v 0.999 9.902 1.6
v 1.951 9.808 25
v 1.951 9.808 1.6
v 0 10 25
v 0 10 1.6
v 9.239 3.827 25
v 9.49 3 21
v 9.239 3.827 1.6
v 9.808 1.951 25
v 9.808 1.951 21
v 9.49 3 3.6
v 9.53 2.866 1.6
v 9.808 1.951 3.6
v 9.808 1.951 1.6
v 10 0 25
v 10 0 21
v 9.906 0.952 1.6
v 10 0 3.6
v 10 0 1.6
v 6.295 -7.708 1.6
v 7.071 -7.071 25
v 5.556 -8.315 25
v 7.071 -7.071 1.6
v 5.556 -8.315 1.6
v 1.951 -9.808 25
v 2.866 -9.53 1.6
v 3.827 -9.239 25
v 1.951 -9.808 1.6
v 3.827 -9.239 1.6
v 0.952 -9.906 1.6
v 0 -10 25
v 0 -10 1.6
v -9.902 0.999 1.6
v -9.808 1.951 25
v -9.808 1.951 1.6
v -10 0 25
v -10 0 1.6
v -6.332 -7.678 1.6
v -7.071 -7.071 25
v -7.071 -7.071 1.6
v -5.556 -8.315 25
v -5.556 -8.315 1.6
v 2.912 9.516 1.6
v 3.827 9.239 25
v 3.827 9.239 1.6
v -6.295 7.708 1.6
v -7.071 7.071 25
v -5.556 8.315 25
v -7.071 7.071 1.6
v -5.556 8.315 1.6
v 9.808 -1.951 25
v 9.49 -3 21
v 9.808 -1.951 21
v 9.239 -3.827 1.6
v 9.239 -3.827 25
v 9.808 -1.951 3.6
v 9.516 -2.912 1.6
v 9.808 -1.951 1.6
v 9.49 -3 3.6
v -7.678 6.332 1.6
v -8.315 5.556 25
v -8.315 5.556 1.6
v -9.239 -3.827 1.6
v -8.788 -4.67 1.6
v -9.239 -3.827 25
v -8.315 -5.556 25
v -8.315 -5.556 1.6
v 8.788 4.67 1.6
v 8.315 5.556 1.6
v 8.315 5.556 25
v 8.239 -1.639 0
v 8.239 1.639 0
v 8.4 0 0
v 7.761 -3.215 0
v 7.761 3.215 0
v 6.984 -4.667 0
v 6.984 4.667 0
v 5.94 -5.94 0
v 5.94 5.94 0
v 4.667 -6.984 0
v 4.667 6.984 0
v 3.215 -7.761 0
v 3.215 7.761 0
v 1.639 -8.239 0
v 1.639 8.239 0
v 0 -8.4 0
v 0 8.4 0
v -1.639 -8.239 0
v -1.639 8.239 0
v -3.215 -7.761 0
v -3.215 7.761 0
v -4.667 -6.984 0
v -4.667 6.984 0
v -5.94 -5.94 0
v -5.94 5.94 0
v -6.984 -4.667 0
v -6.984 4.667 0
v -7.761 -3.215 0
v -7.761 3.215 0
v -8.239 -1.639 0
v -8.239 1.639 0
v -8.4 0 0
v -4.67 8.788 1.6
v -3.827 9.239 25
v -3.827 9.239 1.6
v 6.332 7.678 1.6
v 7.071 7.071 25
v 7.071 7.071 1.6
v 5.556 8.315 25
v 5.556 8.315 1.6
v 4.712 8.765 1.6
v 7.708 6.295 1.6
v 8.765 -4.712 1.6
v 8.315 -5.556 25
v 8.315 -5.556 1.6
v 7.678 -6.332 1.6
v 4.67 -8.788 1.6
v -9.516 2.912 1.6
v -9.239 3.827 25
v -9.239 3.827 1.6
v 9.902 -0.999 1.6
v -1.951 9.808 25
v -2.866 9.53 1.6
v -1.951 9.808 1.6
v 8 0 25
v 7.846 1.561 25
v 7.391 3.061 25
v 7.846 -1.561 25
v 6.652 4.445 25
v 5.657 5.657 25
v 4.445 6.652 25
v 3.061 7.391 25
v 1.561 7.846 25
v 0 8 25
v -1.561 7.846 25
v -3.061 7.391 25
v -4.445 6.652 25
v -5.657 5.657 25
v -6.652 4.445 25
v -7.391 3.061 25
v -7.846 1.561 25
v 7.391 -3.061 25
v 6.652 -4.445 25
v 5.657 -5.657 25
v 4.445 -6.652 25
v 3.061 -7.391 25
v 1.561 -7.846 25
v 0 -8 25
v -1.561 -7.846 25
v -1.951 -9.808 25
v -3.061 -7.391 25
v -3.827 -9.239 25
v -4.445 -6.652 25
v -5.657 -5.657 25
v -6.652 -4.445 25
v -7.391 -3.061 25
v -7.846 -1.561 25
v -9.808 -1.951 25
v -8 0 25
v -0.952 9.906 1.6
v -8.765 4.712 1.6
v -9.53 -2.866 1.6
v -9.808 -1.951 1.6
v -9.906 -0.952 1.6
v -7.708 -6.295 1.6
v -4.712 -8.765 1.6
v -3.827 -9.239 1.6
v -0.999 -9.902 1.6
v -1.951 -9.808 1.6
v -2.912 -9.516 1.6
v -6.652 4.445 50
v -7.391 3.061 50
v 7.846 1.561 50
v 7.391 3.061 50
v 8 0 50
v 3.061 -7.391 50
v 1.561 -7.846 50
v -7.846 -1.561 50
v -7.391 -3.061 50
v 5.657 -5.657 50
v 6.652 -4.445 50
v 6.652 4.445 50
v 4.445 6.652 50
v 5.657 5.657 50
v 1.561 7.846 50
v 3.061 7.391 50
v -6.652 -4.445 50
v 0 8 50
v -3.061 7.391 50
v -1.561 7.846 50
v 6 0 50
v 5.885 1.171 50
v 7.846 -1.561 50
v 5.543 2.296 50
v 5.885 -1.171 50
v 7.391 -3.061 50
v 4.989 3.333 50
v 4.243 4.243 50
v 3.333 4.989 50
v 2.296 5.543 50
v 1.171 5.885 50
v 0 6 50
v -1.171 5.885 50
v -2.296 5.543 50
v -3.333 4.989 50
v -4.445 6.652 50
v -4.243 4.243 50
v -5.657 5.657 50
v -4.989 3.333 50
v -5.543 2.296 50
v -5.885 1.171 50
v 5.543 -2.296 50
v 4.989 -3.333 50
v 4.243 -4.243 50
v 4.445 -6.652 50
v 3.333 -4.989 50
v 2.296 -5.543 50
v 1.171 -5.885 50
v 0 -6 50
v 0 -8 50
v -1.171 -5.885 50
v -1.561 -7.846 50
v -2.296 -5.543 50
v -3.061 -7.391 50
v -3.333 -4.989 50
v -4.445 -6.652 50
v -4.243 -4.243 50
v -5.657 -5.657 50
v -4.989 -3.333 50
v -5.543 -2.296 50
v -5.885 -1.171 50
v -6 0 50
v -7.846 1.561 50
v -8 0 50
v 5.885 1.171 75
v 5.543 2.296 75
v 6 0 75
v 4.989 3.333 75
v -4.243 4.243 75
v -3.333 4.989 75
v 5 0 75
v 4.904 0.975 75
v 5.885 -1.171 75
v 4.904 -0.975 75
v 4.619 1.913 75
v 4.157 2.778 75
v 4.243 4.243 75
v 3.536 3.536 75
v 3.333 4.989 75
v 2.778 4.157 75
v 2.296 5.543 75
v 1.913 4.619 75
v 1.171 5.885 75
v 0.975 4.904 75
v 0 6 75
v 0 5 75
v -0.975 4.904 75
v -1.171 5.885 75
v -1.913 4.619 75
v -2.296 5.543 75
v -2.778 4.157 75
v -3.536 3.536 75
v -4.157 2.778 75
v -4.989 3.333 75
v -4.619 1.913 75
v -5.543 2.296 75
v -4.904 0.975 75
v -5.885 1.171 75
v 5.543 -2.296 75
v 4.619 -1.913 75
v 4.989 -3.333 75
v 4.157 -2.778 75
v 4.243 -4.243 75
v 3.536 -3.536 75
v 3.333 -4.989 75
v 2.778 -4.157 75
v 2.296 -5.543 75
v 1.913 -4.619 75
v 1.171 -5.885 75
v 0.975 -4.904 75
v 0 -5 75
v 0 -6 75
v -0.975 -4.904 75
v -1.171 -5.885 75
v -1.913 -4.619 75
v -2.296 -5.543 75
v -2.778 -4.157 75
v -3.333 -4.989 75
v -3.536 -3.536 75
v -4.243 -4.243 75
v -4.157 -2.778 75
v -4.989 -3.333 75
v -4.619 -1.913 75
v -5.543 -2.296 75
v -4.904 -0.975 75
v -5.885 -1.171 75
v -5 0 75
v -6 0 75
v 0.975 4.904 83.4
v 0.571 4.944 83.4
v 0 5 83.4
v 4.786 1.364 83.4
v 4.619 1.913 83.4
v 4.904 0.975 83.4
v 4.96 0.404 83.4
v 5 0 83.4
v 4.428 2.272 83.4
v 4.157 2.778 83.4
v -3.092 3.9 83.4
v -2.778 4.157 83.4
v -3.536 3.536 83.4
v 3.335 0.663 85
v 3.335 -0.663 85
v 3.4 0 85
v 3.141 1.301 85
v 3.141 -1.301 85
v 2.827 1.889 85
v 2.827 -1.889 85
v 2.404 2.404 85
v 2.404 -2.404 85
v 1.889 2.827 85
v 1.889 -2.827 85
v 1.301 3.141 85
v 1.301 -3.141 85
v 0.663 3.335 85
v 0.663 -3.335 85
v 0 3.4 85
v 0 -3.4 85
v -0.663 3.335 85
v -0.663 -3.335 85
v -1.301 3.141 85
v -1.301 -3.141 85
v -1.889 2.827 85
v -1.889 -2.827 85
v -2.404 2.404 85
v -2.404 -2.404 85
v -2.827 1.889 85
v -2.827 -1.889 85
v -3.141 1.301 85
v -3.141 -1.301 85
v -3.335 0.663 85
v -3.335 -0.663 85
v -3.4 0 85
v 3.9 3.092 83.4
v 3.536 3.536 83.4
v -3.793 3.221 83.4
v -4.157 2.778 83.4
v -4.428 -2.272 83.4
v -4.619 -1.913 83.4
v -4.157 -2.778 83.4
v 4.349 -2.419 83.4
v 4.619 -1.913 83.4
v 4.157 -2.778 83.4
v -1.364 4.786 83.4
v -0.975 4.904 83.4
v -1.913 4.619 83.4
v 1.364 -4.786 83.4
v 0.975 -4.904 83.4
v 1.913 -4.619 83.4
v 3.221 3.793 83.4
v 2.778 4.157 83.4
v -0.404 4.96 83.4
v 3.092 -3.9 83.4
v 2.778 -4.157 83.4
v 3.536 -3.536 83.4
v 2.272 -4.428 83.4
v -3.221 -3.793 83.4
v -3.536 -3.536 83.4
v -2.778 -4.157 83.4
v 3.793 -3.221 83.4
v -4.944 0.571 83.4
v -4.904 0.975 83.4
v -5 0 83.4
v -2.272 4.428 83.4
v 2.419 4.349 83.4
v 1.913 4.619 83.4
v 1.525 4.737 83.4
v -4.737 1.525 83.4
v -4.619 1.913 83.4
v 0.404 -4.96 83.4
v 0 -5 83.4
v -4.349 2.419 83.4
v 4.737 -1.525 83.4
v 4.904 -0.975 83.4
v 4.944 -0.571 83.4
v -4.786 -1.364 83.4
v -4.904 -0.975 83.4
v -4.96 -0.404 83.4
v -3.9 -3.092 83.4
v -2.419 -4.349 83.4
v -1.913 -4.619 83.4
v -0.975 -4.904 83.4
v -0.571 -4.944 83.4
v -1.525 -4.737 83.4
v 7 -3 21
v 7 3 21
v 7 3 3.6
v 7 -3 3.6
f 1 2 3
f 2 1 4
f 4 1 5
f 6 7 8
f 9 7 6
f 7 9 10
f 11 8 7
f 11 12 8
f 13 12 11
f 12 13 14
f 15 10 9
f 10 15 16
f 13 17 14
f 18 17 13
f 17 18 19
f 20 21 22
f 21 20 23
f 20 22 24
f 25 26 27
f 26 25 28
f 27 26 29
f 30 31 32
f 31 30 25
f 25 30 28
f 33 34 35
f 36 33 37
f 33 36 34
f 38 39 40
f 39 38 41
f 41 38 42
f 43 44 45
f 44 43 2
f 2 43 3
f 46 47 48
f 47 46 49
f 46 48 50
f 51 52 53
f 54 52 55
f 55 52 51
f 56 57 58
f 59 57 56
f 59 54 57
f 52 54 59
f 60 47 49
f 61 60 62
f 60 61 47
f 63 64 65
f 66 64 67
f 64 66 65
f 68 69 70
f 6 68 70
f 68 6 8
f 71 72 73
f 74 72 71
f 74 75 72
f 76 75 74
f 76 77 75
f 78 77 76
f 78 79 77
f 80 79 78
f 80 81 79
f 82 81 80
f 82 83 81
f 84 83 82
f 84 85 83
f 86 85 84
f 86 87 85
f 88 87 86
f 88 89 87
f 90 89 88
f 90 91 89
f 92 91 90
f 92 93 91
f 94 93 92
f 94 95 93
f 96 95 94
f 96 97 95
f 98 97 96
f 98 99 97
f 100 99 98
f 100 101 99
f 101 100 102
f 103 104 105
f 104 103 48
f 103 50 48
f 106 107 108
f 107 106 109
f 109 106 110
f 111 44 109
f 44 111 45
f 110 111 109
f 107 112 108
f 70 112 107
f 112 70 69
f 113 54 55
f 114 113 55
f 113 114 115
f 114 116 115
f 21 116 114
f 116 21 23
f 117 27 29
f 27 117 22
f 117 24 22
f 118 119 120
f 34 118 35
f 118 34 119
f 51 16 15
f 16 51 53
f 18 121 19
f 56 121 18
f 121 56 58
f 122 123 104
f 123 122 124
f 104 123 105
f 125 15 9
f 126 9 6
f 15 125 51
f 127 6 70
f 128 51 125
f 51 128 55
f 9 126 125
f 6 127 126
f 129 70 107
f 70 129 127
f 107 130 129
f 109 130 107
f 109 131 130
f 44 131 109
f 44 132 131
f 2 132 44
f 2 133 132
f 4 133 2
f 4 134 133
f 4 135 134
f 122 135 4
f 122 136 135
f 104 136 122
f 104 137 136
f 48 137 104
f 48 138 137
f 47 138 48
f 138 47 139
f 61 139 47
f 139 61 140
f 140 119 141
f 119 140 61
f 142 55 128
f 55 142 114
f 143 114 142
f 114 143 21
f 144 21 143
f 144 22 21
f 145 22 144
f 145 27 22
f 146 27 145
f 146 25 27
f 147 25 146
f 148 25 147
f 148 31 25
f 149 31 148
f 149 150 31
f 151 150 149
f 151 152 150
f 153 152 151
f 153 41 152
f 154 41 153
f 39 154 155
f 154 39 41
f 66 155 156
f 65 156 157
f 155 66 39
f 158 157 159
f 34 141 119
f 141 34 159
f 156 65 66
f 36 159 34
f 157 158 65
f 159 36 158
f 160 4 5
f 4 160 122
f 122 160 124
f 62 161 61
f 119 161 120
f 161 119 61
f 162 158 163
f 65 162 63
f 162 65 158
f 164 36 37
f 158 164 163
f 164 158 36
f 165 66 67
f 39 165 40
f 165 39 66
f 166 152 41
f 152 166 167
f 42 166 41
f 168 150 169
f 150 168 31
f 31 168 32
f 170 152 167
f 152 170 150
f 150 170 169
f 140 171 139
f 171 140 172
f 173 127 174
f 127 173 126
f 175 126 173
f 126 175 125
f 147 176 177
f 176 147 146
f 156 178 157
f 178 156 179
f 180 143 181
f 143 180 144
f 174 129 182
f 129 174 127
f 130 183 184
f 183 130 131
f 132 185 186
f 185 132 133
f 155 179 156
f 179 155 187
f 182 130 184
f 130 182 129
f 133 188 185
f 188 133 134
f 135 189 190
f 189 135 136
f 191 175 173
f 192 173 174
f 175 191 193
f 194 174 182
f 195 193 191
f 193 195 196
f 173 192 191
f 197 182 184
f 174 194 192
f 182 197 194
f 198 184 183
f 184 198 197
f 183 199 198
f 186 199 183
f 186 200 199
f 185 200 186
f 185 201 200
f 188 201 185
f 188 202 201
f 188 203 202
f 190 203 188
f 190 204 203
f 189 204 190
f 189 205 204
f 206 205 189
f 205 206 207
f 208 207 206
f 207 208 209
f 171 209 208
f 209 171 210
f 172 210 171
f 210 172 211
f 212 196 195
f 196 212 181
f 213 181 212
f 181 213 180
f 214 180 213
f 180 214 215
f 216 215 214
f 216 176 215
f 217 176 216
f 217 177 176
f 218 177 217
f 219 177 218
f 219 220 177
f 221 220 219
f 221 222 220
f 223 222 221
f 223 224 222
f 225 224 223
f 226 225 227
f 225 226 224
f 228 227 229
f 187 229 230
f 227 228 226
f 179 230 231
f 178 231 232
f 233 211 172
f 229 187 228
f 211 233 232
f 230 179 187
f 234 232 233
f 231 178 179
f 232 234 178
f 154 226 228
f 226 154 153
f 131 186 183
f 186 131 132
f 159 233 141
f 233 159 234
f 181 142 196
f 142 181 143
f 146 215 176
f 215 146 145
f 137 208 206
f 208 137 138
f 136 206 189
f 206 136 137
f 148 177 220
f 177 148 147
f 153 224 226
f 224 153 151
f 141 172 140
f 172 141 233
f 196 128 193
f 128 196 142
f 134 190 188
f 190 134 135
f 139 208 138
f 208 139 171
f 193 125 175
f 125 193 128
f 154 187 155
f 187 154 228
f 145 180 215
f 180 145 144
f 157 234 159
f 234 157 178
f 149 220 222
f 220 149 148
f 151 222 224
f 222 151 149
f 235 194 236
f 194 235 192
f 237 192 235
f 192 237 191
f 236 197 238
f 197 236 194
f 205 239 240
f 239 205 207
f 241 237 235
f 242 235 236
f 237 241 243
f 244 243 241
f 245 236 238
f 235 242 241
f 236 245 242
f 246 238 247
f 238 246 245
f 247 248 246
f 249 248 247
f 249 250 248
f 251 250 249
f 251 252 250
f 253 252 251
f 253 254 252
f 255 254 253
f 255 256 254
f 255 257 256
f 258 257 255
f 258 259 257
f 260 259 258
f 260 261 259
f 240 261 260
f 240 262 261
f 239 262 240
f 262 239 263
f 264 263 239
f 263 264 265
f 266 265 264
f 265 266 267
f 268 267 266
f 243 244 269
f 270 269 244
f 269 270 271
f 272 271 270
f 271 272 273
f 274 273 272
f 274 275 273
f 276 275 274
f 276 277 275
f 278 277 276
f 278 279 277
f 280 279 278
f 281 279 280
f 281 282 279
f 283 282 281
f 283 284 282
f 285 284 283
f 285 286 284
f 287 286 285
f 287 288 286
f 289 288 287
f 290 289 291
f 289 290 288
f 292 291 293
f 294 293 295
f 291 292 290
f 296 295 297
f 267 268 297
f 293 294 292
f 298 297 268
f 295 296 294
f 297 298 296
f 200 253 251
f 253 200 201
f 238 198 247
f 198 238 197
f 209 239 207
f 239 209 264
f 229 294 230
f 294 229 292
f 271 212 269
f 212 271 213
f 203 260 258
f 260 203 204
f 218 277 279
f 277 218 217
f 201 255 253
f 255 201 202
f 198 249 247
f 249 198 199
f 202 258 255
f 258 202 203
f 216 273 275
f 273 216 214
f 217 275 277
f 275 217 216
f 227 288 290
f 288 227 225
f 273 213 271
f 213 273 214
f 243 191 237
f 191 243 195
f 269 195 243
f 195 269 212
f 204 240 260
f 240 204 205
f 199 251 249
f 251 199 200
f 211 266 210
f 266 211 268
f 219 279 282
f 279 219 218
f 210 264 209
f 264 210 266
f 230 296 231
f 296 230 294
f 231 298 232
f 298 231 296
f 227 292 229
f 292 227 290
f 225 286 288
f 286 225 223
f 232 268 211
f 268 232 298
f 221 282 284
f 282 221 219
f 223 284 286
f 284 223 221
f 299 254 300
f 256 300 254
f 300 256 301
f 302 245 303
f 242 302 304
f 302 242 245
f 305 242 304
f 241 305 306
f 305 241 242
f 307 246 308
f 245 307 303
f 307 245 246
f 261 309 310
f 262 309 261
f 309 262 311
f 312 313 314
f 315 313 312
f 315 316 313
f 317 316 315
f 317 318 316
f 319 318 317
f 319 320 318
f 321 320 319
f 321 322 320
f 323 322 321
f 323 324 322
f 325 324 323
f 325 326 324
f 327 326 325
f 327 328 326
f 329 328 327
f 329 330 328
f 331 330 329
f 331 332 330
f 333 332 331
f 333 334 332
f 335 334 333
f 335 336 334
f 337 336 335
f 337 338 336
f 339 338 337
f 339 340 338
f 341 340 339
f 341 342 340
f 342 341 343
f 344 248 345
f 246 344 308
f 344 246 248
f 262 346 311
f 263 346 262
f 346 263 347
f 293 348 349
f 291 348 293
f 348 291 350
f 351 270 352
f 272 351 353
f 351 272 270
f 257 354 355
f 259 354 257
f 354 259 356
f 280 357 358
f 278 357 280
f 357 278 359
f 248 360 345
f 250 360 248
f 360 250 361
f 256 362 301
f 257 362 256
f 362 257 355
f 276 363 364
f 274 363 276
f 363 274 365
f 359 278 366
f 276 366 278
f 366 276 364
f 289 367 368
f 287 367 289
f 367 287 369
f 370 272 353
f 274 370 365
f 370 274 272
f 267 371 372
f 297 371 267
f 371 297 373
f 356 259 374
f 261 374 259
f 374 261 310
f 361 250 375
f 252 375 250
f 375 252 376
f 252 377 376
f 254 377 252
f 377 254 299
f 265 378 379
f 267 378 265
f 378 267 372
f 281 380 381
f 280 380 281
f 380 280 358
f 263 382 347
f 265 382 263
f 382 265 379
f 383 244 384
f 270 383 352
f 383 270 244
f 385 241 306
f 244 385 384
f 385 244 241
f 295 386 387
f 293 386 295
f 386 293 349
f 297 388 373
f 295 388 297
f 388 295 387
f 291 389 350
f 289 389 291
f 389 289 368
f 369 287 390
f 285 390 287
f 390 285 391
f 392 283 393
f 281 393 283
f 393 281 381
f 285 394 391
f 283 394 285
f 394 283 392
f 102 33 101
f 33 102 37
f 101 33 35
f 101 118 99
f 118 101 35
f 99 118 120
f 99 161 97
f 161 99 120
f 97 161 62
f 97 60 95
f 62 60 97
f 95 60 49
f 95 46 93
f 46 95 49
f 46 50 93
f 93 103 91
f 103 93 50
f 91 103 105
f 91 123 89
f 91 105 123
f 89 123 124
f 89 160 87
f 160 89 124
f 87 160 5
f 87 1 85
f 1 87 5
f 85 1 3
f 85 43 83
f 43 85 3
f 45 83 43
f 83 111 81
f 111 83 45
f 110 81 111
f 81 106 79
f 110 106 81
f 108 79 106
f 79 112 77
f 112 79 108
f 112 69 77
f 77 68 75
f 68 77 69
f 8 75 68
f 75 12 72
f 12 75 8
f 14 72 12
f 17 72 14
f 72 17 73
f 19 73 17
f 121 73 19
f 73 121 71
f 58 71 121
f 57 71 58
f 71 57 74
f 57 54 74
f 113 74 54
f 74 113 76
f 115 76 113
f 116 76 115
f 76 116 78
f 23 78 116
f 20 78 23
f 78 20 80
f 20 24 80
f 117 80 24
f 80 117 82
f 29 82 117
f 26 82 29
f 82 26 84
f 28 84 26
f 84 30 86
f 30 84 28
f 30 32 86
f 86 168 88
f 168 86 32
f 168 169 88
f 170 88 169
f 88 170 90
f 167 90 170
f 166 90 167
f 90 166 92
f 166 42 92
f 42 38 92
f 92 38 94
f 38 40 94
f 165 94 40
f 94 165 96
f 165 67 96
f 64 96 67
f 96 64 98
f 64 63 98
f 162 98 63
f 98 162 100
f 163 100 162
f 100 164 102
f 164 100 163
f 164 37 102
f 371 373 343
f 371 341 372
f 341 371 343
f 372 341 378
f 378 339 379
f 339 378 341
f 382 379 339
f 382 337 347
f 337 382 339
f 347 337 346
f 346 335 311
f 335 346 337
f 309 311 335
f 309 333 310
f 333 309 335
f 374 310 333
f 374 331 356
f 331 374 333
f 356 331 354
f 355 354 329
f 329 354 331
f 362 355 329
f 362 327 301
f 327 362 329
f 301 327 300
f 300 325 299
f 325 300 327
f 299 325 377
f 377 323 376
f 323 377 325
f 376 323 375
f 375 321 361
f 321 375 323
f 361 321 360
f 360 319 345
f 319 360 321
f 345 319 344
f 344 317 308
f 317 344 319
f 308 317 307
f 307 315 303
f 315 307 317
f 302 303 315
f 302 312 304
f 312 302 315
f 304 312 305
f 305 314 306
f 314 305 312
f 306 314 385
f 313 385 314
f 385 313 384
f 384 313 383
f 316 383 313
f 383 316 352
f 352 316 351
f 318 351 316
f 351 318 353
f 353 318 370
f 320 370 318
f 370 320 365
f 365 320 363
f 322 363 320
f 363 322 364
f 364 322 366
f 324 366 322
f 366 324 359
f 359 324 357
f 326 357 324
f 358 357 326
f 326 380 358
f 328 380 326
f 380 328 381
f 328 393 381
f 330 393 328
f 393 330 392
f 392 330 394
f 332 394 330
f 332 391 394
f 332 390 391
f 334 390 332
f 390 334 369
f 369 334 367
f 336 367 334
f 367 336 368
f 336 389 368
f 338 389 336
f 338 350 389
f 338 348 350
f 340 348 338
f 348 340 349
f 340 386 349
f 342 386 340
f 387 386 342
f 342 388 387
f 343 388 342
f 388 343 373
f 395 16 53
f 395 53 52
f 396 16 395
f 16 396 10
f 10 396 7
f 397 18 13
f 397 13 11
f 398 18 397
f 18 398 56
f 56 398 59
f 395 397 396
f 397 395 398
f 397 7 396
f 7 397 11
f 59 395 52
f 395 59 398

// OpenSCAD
$fn = 32;

// ----------------------------------------------------------------------
// Stepped shaft: diameters 20, 16, 12, 10 mm, 85 mm long
// ----------------------------------------------------------------------

// --- parameters (mm) ---
d1 = 20;                  // step 1 diameter
len1 = 25;                // step 1 length
d2 = 16;                  // step 2 diameter
len2 = 25;                // step 2 length
d3 = 12;                  // step 3 diameter
len3 = 25;                // step 3 length
d4 = 10;                  // step 4 diameter
len4 = 10;                // step 4 length
total = 85;               // overall length
chamfer = 1.6;            // end chamfer
key_w = 6;                // keyway width
key_d = 3;                // keyway depth
key_len = 17.4;           // keyway length
key_z = 3.6;              // keyway start along the shaft

difference() {
  /* turned body: stacked cylinders, every step sunk into the bigger one */
  union() {
    cylinder(h = len1, d = d1);
    translate([0, 0, 24.6]) cylinder(h = 25.4, d = d2);
    translate([0, 0, 49.6]) cylinder(h = 25.4, d = d3);
    translate([0, 0, 74.6]) cylinder(h = 10.4, d = d4);
  }
  /* bottom chamfer ring cut */
  rotate_extrude() translate([8.4, -2.5]) polygon([[0, 0], [4.1, 0], [4.1, 6.6], [0, 2.5]]);
  /* top chamfer ring cut */
  rotate_extrude() translate([3.4, 85]) polygon([[0, 0], [4.1, -4.1], [4.1, 2.5], [0, 2.5]]);
  /* keyway milled along the first step */
  translate([d1 / 2 - key_d, -key_w / 2, key_z]) cube([key_d + 2.5, key_w, key_len]);
}
